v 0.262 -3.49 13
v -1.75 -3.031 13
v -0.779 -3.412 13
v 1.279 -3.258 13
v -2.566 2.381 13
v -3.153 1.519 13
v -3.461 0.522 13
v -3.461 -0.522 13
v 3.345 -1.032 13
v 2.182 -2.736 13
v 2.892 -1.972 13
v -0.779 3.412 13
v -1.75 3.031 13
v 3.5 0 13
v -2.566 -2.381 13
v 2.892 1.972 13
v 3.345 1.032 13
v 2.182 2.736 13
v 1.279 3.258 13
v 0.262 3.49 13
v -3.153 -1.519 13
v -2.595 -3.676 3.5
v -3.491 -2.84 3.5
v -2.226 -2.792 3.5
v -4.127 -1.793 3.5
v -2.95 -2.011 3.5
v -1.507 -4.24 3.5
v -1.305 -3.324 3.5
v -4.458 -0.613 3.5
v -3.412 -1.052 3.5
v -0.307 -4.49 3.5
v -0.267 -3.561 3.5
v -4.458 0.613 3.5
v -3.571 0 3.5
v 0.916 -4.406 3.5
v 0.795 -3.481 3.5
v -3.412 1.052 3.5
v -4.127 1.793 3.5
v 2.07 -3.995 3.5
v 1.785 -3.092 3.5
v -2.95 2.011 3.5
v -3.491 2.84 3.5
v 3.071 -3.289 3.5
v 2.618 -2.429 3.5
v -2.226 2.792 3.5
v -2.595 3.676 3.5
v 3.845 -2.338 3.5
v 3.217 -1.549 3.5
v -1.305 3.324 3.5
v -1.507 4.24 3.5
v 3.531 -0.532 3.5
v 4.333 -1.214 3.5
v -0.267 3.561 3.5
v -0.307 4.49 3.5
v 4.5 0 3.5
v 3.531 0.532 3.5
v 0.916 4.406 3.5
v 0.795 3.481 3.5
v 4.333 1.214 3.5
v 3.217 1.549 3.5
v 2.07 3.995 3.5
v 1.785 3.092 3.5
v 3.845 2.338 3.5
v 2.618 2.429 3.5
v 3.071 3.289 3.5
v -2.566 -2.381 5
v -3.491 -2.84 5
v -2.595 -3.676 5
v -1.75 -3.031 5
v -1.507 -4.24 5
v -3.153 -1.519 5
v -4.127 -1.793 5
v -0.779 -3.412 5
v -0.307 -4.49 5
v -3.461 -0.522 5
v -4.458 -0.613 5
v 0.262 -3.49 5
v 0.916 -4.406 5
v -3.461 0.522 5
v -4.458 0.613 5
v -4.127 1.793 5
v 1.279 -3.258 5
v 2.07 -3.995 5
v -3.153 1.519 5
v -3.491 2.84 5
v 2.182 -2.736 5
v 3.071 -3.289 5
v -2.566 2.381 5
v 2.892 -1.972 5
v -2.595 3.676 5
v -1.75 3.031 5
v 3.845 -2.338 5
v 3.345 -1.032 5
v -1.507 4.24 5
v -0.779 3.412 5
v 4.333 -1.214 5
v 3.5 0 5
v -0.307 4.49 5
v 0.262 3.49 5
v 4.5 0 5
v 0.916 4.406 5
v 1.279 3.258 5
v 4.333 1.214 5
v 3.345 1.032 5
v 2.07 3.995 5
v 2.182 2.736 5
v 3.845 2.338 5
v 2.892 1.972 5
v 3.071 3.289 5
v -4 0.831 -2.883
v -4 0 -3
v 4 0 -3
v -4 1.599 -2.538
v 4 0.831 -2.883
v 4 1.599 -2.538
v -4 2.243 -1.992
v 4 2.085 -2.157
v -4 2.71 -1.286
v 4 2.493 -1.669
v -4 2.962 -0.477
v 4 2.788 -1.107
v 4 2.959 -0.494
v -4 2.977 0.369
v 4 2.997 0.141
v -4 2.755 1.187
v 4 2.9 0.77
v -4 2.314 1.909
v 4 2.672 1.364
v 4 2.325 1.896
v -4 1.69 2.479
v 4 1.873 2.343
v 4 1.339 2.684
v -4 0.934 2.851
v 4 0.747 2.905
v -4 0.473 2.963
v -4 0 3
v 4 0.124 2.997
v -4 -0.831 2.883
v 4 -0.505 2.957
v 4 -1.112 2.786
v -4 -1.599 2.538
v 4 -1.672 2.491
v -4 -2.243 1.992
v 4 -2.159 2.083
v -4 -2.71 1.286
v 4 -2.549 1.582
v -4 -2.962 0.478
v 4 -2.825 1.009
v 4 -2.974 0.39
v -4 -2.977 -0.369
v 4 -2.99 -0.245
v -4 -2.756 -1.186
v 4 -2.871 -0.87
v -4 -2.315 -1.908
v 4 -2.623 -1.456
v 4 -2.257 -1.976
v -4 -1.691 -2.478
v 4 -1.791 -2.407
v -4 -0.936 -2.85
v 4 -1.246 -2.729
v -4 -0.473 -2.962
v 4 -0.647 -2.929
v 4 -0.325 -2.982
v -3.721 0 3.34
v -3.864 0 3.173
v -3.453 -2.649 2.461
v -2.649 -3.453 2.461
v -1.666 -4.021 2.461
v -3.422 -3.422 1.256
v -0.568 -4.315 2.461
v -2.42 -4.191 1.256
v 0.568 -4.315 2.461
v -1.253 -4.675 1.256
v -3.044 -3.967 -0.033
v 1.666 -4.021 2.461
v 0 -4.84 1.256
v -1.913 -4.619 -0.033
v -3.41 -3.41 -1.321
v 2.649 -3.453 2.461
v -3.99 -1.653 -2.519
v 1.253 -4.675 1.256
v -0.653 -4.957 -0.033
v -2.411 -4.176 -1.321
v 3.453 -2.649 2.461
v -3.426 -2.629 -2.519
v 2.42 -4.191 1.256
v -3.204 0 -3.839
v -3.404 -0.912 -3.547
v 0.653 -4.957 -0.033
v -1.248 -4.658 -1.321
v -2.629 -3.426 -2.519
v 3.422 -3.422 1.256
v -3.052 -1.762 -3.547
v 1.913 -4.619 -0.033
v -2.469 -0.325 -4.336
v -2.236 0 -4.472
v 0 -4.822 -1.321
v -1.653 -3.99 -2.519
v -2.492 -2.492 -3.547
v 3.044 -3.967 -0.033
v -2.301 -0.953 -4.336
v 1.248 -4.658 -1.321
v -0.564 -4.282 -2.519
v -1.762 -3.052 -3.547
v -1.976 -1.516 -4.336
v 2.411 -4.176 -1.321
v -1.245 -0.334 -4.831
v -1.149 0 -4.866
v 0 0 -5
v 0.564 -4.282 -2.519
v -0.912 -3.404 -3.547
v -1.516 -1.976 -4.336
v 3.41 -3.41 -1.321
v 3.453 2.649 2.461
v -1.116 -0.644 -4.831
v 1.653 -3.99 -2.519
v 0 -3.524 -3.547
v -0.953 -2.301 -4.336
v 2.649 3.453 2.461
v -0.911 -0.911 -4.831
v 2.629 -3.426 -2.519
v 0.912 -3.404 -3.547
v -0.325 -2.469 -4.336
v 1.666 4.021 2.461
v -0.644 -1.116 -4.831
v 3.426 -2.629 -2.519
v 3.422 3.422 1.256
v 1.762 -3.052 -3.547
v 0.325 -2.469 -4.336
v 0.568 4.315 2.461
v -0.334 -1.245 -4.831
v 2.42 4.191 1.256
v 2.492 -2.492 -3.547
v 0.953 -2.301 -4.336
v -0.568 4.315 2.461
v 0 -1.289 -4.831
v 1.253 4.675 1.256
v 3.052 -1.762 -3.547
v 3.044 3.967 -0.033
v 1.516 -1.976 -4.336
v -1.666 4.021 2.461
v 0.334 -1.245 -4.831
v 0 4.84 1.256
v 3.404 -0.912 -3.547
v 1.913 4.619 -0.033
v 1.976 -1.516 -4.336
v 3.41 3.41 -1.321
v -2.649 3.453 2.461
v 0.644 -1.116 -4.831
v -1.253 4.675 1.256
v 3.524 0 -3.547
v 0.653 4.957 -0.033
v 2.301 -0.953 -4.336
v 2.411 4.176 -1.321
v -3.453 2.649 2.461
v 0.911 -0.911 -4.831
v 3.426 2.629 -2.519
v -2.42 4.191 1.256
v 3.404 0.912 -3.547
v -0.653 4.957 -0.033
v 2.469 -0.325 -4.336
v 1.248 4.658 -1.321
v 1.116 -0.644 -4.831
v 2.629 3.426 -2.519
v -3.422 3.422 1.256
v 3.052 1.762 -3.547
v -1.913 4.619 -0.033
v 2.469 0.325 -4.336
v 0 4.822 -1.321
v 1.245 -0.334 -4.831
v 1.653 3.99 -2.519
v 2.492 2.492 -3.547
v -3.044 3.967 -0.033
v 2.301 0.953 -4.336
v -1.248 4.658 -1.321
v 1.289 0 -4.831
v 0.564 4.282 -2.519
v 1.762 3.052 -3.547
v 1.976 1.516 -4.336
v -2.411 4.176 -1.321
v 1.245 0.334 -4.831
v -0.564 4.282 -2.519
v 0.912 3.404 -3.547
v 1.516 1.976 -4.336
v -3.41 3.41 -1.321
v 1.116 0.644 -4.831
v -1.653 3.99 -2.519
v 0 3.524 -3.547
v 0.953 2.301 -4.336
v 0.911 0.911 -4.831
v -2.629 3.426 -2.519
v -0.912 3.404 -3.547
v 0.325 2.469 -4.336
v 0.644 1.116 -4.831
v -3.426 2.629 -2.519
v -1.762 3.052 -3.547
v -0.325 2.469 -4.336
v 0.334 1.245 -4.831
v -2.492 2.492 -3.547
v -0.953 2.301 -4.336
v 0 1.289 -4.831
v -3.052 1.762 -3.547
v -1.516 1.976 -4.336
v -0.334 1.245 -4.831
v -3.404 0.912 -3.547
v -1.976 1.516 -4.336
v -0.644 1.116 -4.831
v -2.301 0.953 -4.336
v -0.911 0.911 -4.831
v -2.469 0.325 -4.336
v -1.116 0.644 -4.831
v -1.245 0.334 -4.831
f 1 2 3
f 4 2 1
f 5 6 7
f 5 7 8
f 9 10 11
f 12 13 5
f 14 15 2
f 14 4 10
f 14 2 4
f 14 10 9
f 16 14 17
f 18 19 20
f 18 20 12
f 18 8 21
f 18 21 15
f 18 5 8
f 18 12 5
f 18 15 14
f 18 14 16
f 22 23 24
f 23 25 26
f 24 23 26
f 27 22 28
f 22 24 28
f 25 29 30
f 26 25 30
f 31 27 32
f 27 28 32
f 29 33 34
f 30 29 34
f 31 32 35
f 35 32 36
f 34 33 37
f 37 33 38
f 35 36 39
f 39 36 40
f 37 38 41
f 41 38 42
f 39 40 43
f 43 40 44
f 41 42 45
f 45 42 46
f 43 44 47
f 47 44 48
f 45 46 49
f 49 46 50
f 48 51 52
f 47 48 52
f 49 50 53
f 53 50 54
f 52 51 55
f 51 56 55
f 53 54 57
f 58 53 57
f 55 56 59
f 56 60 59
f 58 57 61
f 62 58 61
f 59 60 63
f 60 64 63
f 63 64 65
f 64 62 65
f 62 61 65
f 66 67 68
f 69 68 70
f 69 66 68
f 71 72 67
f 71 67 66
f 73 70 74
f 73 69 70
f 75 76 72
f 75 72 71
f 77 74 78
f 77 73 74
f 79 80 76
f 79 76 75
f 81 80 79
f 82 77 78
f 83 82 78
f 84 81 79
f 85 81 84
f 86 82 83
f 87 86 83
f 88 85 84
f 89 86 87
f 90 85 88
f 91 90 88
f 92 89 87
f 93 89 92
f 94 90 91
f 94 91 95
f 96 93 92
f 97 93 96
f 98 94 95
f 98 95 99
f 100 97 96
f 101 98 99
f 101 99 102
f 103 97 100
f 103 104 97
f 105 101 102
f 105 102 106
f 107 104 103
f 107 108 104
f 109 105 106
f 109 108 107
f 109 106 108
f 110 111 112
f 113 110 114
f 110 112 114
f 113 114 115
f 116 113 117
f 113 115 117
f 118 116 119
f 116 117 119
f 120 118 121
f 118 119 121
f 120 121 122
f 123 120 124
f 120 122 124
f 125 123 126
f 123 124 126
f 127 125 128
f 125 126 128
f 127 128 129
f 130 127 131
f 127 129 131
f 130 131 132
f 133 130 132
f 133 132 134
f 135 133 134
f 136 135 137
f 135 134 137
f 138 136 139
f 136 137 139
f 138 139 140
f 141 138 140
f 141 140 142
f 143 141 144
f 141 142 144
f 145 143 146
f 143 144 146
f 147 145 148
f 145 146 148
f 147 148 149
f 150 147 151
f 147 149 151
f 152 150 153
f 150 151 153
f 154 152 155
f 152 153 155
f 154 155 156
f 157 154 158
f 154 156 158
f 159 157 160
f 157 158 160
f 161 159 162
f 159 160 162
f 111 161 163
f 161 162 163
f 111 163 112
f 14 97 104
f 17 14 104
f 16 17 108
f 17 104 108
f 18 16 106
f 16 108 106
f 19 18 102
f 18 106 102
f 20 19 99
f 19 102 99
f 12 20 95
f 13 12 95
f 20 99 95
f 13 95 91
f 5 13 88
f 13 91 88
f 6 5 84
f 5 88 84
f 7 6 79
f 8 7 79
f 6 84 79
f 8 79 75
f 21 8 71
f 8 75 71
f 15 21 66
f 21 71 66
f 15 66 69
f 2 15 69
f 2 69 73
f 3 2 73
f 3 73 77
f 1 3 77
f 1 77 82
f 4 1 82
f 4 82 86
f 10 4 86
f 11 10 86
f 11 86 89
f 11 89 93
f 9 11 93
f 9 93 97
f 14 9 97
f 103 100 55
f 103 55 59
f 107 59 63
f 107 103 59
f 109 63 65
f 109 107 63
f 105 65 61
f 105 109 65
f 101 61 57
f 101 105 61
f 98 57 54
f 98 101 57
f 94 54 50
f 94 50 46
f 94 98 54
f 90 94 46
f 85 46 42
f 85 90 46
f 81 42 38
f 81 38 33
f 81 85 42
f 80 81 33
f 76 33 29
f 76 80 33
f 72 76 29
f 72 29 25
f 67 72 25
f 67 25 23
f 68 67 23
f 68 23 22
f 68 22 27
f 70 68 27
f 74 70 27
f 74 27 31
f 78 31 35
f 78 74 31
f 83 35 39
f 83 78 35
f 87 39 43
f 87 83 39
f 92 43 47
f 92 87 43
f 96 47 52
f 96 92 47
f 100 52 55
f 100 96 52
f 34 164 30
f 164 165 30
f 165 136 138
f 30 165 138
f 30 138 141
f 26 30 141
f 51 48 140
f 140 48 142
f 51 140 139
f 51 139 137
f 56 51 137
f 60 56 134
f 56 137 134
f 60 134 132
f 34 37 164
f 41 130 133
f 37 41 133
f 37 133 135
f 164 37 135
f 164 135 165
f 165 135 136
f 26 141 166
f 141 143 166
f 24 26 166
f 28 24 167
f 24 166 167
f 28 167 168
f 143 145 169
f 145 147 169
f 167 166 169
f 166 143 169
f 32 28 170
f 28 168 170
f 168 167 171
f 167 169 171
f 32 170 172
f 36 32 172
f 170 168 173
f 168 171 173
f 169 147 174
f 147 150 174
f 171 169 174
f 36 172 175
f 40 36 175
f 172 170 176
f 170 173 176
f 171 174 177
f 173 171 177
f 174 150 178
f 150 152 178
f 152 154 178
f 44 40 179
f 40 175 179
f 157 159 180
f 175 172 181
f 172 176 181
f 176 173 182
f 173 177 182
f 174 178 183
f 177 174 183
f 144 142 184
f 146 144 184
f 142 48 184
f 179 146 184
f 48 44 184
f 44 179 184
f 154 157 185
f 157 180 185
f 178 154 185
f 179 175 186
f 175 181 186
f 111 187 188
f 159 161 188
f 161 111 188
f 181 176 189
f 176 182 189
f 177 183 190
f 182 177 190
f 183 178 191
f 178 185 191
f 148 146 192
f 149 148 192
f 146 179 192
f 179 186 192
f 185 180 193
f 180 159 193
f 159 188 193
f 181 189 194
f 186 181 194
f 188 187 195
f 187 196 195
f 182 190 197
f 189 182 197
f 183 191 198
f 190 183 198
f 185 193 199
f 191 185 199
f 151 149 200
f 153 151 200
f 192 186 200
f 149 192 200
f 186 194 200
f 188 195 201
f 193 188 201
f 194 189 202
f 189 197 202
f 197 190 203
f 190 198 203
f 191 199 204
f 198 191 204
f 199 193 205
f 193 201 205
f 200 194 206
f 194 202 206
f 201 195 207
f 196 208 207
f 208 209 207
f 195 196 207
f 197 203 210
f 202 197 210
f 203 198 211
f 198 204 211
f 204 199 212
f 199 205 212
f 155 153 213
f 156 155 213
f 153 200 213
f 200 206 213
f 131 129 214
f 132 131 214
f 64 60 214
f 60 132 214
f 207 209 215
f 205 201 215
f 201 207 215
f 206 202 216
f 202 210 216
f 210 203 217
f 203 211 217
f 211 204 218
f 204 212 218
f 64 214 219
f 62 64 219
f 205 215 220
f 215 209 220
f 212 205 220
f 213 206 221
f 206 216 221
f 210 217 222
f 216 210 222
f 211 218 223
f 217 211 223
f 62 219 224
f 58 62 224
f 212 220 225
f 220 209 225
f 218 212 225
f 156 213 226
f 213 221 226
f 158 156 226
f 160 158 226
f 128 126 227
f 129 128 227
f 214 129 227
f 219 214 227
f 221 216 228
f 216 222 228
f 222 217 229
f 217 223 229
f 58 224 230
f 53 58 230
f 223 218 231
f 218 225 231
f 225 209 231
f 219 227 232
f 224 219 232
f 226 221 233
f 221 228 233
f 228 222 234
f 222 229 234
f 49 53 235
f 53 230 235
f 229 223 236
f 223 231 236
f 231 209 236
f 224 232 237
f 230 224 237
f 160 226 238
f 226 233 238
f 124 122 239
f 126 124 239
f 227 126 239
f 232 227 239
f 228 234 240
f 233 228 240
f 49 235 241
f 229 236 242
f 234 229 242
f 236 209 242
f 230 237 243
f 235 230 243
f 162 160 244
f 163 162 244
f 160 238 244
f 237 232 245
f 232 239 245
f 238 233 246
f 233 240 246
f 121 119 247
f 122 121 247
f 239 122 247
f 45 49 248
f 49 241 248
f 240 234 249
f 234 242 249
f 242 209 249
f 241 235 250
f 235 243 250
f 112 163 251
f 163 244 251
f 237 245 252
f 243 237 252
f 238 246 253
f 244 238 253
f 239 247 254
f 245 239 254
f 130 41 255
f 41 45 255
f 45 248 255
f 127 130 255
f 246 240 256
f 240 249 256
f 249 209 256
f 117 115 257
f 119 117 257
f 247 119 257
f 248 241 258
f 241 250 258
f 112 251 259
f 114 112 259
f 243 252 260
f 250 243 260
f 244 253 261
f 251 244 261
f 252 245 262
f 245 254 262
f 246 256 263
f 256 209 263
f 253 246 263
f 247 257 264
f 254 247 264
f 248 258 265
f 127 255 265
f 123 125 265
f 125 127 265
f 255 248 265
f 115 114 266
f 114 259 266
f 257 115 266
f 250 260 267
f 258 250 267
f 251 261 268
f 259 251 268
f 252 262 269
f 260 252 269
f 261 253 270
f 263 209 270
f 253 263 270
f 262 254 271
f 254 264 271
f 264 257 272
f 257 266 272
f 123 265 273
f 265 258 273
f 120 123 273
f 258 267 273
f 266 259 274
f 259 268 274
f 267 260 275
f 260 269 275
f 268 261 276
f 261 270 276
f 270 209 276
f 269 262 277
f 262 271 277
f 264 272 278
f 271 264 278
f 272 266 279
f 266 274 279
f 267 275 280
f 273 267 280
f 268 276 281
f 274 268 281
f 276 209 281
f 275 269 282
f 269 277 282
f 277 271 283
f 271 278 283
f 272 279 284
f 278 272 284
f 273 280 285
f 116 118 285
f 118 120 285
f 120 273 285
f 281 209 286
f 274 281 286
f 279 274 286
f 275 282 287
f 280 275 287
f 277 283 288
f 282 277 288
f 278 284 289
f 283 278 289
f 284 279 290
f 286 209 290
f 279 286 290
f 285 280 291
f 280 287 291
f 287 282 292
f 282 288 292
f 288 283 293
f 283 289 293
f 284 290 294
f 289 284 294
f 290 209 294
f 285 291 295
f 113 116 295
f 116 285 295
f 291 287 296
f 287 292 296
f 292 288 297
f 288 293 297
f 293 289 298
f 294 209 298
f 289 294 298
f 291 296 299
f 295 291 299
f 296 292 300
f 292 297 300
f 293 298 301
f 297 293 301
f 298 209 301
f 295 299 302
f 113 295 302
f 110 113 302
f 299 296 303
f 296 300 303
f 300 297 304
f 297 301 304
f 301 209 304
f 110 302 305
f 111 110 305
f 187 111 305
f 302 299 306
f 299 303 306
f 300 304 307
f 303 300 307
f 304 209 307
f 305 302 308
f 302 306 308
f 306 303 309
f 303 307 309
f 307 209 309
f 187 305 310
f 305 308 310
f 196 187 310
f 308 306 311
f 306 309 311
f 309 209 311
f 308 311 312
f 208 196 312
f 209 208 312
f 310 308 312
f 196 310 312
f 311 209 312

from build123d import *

# Parameters (mm, degrees)
SKETCH_5_R               = 3.5
EXTRUDE_2_DEPTH          = 13
CUT_EXTRUDE_2_DEPTH      = 13
CUT_EXTRUDE_2_DEPTH_BACK = 13
SKETCH_6_R               = 3
SKETCH_7_R               = 4.5
EXTRUDE_3_DEPTH          = 1.5


with BuildPart() as part:
    # 草图1 → 旋转5 (revolve)
    with BuildSketch(Plane(origin=(0, 0, 0), x_dir=(1, 0, 0), z_dir=(0, 1, 0))):
        with BuildLine():
            Line((0, 5), (0, -5))
            ThreePointArc((0, -5), (-5, 0), (0, 5))
        make_face()
    revolve(axis=Axis((0, 0, -5), (0, 0, 1)))

    # 草图5 → 凸台-拉伸2 (add)
    with BuildSketch(Plane.XY):
        Circle(SKETCH_5_R)
    extrude(amount=EXTRUDE_2_DEPTH)

    # 草图6 → 切除-拉伸2 (cut, two sides: drawn at the far end of the back side and taken through both)
    with BuildSketch(Plane(origin=(0, 0, 0), x_dir=(0, 0, -1), z_dir=(1, 0, 0)).offset(-CUT_EXTRUDE_2_DEPTH_BACK)):
        Circle(SKETCH_6_R)
    extrude(amount=CUT_EXTRUDE_2_DEPTH + CUT_EXTRUDE_2_DEPTH_BACK, mode=Mode.SUBTRACT)

    # 草图7 → 凸台-拉伸3 (add)
    with BuildSketch(Plane.XY.offset(5)):
        Circle(SKETCH_7_R)
    extrude(amount=-EXTRUDE_3_DEPTH)


solid = part.part
